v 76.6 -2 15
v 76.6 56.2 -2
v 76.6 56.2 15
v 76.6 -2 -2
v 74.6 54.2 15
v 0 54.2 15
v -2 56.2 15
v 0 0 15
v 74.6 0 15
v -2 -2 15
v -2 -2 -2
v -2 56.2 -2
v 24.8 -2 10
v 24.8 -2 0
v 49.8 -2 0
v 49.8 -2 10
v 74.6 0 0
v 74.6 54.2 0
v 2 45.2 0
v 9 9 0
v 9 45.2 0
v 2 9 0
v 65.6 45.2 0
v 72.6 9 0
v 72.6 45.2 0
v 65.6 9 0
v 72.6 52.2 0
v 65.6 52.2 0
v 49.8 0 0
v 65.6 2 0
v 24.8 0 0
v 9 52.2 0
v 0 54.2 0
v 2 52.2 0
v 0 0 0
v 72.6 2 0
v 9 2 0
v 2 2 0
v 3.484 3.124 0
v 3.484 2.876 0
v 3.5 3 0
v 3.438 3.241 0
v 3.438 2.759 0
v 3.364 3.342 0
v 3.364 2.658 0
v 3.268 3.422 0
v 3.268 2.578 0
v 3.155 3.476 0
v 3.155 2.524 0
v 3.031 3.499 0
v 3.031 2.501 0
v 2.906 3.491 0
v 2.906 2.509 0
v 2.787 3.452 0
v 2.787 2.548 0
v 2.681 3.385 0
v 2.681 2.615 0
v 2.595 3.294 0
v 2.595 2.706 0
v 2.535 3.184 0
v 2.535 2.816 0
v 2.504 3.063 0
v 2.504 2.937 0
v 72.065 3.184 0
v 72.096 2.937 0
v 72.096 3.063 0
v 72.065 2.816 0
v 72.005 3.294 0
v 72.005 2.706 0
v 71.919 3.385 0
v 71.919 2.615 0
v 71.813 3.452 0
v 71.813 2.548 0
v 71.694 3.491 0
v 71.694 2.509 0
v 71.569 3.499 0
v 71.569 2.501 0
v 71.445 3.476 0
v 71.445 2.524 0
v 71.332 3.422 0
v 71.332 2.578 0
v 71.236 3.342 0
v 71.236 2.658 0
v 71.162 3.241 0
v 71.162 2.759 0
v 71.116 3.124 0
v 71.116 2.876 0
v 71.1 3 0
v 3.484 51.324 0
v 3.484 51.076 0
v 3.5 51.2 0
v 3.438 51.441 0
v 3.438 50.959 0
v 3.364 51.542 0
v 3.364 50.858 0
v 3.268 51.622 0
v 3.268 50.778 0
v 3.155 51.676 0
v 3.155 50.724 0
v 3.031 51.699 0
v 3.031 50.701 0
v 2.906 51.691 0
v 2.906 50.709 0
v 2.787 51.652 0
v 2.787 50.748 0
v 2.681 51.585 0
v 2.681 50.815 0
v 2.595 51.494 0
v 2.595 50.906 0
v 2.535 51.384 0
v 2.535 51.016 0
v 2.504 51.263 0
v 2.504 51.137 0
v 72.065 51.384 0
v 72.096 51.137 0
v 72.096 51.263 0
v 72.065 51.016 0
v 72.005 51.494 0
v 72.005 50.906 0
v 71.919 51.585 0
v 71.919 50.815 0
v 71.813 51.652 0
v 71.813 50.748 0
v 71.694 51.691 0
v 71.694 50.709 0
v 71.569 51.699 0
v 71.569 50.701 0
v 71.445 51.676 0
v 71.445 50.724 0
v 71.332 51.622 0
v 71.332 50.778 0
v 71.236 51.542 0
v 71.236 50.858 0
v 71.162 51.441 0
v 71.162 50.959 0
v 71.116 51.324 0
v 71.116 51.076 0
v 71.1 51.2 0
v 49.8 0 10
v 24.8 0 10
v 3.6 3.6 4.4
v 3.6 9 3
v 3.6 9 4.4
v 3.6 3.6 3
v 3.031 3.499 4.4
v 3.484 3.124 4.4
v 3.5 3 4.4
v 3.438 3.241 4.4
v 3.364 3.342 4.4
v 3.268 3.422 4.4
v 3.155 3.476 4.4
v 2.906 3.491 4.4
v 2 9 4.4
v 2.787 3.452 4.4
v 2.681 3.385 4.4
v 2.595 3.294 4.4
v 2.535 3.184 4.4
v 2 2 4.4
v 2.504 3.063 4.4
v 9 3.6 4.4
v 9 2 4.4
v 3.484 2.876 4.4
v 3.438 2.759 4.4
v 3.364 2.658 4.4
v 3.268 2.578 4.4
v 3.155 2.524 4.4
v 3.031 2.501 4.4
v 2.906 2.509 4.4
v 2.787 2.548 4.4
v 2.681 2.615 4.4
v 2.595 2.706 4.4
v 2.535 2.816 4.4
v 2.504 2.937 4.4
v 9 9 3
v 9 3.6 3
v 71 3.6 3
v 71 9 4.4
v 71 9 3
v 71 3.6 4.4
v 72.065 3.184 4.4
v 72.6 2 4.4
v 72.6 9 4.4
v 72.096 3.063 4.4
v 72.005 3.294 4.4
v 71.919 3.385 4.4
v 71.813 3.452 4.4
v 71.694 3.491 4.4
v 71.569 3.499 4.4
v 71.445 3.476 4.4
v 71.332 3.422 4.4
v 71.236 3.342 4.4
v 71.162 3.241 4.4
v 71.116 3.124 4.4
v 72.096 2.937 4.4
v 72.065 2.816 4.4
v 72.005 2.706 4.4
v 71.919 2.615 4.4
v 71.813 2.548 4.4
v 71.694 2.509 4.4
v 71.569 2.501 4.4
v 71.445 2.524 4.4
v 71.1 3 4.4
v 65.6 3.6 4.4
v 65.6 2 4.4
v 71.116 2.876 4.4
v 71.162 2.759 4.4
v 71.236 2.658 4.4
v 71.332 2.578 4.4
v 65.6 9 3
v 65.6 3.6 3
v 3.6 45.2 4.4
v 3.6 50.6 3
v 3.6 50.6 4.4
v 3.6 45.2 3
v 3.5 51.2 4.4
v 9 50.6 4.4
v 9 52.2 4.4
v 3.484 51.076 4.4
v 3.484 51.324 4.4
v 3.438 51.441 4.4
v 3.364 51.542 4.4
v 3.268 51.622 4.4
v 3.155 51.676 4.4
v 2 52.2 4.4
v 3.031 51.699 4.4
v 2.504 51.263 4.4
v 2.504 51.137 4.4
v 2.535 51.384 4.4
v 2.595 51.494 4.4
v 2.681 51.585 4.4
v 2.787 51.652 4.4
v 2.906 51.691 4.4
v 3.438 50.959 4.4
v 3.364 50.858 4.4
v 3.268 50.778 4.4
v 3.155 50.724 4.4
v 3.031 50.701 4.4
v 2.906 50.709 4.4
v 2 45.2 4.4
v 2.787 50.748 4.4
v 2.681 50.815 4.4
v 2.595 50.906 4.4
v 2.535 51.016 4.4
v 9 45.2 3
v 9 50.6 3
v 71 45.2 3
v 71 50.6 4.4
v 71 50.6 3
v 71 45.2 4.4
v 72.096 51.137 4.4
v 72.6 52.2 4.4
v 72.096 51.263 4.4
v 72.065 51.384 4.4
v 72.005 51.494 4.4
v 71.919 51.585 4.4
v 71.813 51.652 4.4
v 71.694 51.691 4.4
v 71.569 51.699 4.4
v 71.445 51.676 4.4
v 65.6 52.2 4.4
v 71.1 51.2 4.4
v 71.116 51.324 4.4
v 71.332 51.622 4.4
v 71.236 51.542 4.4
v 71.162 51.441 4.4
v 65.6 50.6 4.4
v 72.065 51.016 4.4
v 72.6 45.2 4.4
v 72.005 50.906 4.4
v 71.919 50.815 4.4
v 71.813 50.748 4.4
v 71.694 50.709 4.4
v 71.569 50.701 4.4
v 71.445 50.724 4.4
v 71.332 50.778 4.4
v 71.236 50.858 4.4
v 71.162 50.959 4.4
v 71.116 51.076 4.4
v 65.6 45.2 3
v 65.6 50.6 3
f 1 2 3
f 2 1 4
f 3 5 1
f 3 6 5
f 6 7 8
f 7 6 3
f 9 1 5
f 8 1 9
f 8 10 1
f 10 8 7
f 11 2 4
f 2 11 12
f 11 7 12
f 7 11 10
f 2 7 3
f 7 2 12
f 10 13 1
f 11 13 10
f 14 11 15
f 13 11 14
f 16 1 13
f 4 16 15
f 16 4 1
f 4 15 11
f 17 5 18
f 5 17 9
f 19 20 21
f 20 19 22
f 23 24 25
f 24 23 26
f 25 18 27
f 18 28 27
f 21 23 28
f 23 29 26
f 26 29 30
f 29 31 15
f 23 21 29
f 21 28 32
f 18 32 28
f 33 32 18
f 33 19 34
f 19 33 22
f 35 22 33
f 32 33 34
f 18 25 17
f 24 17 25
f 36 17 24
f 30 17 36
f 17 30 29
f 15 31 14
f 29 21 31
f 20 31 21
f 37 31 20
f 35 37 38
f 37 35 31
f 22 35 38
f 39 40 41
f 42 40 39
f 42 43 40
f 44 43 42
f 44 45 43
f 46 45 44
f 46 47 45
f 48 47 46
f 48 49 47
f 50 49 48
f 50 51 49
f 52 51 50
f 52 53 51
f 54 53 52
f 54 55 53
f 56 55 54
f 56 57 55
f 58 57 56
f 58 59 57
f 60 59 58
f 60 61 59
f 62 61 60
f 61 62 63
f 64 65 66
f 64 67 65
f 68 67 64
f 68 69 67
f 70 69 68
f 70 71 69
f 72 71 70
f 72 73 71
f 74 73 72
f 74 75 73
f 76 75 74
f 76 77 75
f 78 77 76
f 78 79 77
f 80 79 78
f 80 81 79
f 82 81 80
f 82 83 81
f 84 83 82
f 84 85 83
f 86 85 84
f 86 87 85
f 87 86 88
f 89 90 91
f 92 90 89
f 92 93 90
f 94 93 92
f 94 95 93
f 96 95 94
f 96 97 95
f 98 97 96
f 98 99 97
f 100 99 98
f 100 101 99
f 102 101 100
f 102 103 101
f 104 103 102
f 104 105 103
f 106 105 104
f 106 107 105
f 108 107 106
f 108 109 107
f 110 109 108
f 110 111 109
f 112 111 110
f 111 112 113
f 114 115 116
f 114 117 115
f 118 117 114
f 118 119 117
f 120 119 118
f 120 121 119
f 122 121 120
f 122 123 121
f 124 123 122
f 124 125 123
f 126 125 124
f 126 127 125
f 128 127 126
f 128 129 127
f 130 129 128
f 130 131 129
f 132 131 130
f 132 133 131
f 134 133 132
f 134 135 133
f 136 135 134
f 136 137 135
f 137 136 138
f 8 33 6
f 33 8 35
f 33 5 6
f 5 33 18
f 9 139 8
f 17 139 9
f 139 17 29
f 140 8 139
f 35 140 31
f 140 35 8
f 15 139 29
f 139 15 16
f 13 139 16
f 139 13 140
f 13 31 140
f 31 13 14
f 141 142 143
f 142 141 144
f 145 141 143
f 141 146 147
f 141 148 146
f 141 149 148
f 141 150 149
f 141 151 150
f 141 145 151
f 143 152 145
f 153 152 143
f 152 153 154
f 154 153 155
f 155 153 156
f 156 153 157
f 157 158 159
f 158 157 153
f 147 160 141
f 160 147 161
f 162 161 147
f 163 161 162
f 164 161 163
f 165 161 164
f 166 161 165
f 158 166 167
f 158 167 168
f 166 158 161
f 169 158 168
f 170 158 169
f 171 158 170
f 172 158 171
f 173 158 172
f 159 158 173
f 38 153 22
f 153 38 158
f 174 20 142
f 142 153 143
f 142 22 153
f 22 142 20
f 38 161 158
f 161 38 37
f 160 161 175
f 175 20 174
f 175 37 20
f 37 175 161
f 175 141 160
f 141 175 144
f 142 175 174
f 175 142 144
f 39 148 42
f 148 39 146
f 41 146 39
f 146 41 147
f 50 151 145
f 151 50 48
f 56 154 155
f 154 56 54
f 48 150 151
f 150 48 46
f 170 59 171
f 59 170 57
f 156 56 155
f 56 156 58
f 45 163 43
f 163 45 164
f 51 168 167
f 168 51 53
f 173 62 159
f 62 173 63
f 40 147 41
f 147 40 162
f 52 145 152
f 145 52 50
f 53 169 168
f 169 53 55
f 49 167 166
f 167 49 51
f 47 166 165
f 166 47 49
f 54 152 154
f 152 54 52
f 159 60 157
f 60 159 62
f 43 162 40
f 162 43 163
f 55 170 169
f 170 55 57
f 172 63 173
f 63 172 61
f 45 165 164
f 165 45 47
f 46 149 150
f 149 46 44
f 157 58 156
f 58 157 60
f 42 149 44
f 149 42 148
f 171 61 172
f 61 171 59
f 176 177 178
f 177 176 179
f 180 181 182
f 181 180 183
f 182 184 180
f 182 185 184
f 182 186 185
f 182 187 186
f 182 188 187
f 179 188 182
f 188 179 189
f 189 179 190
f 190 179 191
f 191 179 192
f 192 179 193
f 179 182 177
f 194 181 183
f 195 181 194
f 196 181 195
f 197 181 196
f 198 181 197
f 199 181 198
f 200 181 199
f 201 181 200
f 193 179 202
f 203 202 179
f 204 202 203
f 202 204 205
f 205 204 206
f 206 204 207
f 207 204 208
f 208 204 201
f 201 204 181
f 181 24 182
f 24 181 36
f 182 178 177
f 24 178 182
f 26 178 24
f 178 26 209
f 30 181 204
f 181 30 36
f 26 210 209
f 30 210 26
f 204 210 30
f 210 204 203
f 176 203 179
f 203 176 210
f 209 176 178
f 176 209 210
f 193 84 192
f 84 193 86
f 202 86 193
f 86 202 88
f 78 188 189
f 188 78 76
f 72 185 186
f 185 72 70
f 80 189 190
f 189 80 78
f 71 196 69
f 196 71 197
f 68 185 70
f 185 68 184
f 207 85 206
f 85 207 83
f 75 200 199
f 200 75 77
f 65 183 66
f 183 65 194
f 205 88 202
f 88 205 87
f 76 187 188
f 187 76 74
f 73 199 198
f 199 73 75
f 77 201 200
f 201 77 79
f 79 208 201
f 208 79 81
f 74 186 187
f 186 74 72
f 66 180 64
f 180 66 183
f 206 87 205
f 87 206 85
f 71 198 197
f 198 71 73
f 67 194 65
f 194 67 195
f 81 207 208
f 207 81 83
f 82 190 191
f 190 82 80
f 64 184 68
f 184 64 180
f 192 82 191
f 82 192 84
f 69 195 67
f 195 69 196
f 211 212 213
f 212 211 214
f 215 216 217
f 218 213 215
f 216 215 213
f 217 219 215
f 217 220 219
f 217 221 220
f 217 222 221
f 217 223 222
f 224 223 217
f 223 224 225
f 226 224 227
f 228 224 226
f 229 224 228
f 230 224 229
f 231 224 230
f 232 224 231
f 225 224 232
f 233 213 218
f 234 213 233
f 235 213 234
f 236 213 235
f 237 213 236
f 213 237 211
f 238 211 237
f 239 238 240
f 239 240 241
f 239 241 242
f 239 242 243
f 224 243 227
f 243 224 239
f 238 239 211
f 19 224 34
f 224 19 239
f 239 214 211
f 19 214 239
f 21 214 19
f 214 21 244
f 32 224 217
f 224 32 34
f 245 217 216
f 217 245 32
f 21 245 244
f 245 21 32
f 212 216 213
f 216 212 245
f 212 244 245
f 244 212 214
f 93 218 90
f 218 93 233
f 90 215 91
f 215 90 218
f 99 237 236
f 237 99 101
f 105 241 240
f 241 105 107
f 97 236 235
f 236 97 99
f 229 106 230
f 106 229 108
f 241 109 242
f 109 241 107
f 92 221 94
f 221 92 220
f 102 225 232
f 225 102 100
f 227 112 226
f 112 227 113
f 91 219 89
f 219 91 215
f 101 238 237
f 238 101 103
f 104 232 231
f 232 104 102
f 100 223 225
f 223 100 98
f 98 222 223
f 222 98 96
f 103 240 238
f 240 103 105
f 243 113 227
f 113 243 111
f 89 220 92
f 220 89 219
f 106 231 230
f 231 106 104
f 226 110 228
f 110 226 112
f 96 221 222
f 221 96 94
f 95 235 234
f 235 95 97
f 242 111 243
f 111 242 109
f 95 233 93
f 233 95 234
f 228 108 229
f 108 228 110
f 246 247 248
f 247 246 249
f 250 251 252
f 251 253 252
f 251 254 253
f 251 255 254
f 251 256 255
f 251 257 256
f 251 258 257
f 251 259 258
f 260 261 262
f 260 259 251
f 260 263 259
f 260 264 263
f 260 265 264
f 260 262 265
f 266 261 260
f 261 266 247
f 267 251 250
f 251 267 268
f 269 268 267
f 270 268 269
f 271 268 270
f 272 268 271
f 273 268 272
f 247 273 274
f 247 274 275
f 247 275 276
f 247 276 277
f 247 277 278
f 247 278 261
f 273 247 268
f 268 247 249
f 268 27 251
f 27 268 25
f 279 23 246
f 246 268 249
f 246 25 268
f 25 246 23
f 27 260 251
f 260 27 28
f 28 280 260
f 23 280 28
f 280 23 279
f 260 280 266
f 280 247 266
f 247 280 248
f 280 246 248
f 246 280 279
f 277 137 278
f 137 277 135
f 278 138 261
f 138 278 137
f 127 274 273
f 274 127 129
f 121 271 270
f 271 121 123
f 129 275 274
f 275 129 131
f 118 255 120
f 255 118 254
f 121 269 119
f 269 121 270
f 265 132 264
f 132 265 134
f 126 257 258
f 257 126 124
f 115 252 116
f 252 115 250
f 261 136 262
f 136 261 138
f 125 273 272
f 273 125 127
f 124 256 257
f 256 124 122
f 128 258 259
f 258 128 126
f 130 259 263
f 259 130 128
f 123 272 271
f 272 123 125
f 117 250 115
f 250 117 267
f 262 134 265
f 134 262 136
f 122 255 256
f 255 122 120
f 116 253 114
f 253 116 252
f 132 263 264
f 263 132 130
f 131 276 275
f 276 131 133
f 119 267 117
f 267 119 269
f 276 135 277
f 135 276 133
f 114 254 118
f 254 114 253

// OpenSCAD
/*
    Created by Ben Vinck 
    2020/9/3
*/

/* [Model] */
CREATE = "body"; //[body:Body, lid:Lid, block:PCB holder block]

/* [Hidden] */
render_offset = 0.1;

/* [PCB params] */
pcb_length = 66.6;
pcb_width = 46.2;

/* [Case params] */
// Height from the inside bottom to the top edge of the body
case_inside_height = 15;
// Thickness of the body, lid and holder block
case_thickness = 2;
// Spacing behind the PCB holders  Top, right, bottom, left
cable_spaceing = [2,2,2,2];
// Axis on which the cable opening will be
cable_opening_side = "x"; //[none,x,y]
// Shape of the cable opening
cable_opening_shape = "rectangle"; //[rectangle:Rectangle, circle:Circle]
// Dimentions of the rectangular cable opening
cable_opening_dimentions = [25,10];
// Diameter of the circular cable opening
cable_opening_diameter = 3;
// Ammount of circular cable openings
cable_opening_ammount = 2;
// Distance between circular cable opening
cable_opening_spaceing = 2;
// Cable opening offset from its center position
cable_opening_offset = [0,0];

/* [Corner support params] */
// Size of PCB clamps
holder_spacing = 2;
// Size of platfrom supporting the PCB
holder_width = 5;
// Height that the PCB will be held
holder_height = 3;
// Height of the PCB clamps
holder_grip_height = 1.4;
// Offset of the PCB clamps. 0 = PCB width and height, >0 = looser fit, <0 = tighter fit. This value depends on your 3D printer
holder_offset = 0.4; //Ultimaker 2
// Hole in the PCB clamps. This is meant to screw the holder blocks in place. 0 for no hole
holder_hole_diameter = 1;
//Height of the holder block
holder_block_height = 2;

/* [Center support params] */
//Will enable a support in the center. Provides extra support in the center of large PCBs
center_support_enable = false;
// X and Y dimentions of the center support
center_support_size = [20,25];
// Offset from the bottom left PCB corner
center_support_offset = [20,10];

/* [Lid params] */
lid_height = case_thickness;
// Distance that the lid locks into the body
lid_depth = 2;
// Offset between the body and lid. 0 = perfect fit, >0 = looser fit, <0 = tighter fit.
lid_offset = 0.3; //Ultimaker 2
// Enable the viewing window
lid_window = false;
// Size of the window supports. 0 to disable
lid_window_support_size = 5;
// Enable image
lid_image = false;
// Image path
lid_image_file = "image.svg";
// Depth of the image inset
lid_image_depth = 0.5;
// Scale of the image
lid_image_scale = 1;
// Rotation of the image
lid_image_rotation = 0; //[0:0.1:360]
// Positional offset of the image
lid_image_offset = [0,0];
// Enable vents
lid_vent = false;
// Length and width of the vents
lid_vent_dimentions = [30,3];
// Ammount if vent slots
lid_vent_ammount = 4;
// Spaceing between the vents
lid_vent_spacing = 3;
// Rotation of the vents
lid_vent_rotation = 0; //[0:0.1:360]
// Positional offset of the vents
lid_vent_offset = [0,0];

/* Modules */
module true_mirror(m, o){
    children();
    translate(o){
        mirror(m){
            children();    
        }
    }
}

module dual_true_mirror(m1, o1, m2, o2){
    true_mirror(m1, o1){
        true_mirror(m2, o2){
            children();
        };
    };
}

module rotate_around_point(r, pt){
    translate(pt){
        rotate(r){
            translate(-pt){
                children();
            }
        }
    }   
}


/* Generate */
//Case
if(CREATE == "body"){
difference(){
    translate([-case_thickness,-case_thickness,-case_thickness]){
        cube([
            pcb_length+cable_spaceing[3]+cable_spaceing[1]+case_thickness*2+holder_spacing*2,
            pcb_width+cable_spaceing[0]+cable_spaceing[2]+case_thickness*2+holder_spacing*2,
            case_inside_height+case_thickness
        ]);
    }
    cube([
        pcb_length+cable_spaceing[3]+cable_spaceing[1]+holder_spacing*2,
        pcb_width+cable_spaceing[0]+cable_spaceing[2]+holder_spacing*2,
        case_inside_height+render_offset
    ]);
    
    //Cable opening
    if(cable_opening_side == "x"){
        if(cable_opening_shape == "rectangle"){
            translate([
                (pcb_length+holder_spacing*2+cable_spaceing[1]+cable_spaceing[3])/2-cable_opening_dimentions[0]/2 + cable_opening_offset[0],
                -case_thickness - render_offset/2,
                cable_opening_offset[1]
            ]){
                cube([cable_opening_dimentions[0], case_thickness + render_offset, cable_opening_dimentions[1]]);
            }
        }
        else if (cable_opening_shape == "circle"){
            rotate([90,0,0]){
                for(i = [0:cable_opening_ammount-1]){
                    translate([
                        (pcb_length+holder_spacing*2+cable_spaceing[1]+cable_spaceing[3])/2 + cable_opening_offset[0] - (cable_opening_ammount-1)*(cable_opening_diameter/2)-cable_opening_spaceing/2*cable_opening_ammount + i*cable_opening_diameter+i*cable_opening_spaceing,
                        cable_opening_diameter/2 + cable_opening_offset[1],
                        -render_offset/2case_height
                    ]){
                        cylinder(case_thickness + render_offset, d=cable_opening_diameter,$fn=50);
                    }
                }
            }
        }
    }
    else if(cable_opening_side == "y"){
        if(cable_opening_shape == "rectangle"){
            translate([
                -case_thickness - render_offset/2,
                (pcb_width+holder_spacing*2+cable_spaceing[0]+cable_spaceing[2])/2-cable_opening_dimentions[0]/2 + cable_opening_offset[0],
                cable_opening_offset[1]
            ]){
                cube([case_thickness + render_offset,cable_opening_dimentions[0],cable_opening_dimentions[1]]);
            }
        }
        else if (cable_opening_shape == "circle"){
            rotate([0,-90,0]){
                for(i = [0:cable_opening_ammount-1]){
                    translate([
                        cable_opening_diameter/2 + cable_opening_offset[1],
                        (pcb_width+holder_spacing*2+cable_spaceing[0]+cable_spaceing[2])/2 + cable_opening_offset[0] - (cable_opening_ammount-1)*(cable_opening_diameter/2)-cable_opening_spaceing/2*cable_opening_ammount + i*cable_opening_diameter+i*cable_opening_spaceing,
                        -render_offset/2
                    ]){
                        cylinder(case_thickness + render_offset, d=cable_opening_diameter,$fn=50);
                    }
                }
            }
        }
    }
}



//Corner support
translate([cable_spaceing[3], cable_spaceing[2], 0]){
    dual_true_mirror([0,1,0], [0,holder_spacing*2 + pcb_width,0], [1,0,0], [holder_spacing*2 + pcb_length,0,0]){
        difference(){
            //Cube
            union(){
                cube([holder_spacing-holder_offset,holder_spacing + holder_width,holder_height + holder_grip_height]);
                cube([holder_spacing + holder_width,holder_spacing-holder_offset,holder_height + holder_grip_height]);
                cube([holder_spacing + holder_width,holder_spacing + holder_width,holder_height]);
            }
            //Hole
            translate([holder_spacing/2,holder_spacing/2,0]){
                cylinder(holder_height + holder_grip_height + render_offset,d=holder_hole_diameter,$fn=25);
            }
        }
    }
}


//Center support
if(center_support_enable){
translate([
        cable_spaceing[3]+holder_spacing+center_support_offset[0],
        cable_spaceing[2]+holder_spacing+center_support_offset[1],
        0
    ]){
    cube([center_support_size[0],center_support_size[1],holder_height]);
}
}
}



//Lid
if(CREATE == "lid"){
difference(){
    union(){
        difference(){
            //Height
            translate([-case_thickness,-case_thickness,-lid_height]){
                cube([
                    pcb_length+cable_spaceing[3]+cable_spaceing[1]+case_thickness*2+holder_spacing*2,
                    pcb_width+cable_spaceing[0]+cable_spaceing[2]+case_thickness*2+holder_spacing*2,
                lid_height
                ]);
            }
            //Image
            if(lid_image == true){
                translate([
                    (pcb_length+cable_spaceing[3]+cable_spaceing[1]+case_thickness+holder_spacing*2)/2+lid_image_offset[0],
                    (pcb_width+cable_spaceing[0]+cable_spaceing[2]+case_thickness+holder_spacing*2)/2+lid_image_offset[1],
                    -case_thickness-0.1
                ]){
                    rotate([0,0,lid_image_rotation]){
                        scale([-lid_image_scale,lid_image_scale,1]){
                            linear_extrude(lid_image_depth+0.1){
                                import(lid_image_file,center=true);
                            }
                        }
                    }
                }
            }
            //Vent
            if(lid_vent == true){
                translate([
                    (pcb_length+cable_spaceing[3]+cable_spaceing[1]+case_thickness+holder_spacing*2)/2-((lid_vent_dimentions[1]+lid_vent_spacing)*lid_vent_ammount-lid_vent_spacing)/2+lid_vent_offset[0],
                    (pcb_width+cable_spaceing[0]+cable_spaceing[2]+case_thickness+holder_spacing*2)/2-(lid_vent_dimentions[0])/2+lid_vent_offset[1],
                    -case_thickness-0.1
                ]){
                    rotate_around_point([0,0,lid_vent_rotation],[((lid_vent_dimentions[1]+lid_vent_spacing)*lid_vent_ammount-lid_vent_spacing)/2,lid_vent_dimentions[0]/2]){
                        for(i=[0:lid_vent_ammount-1]){
                            translate([i*(lid_vent_spacing+lid_vent_dimentions[1]),0,0]){
                                cube([lid_vent_dimentions[1],lid_vent_dimentions[0],case_thickness+0.2]);
                            }
                        }
                    }
                }
            }
        }
        //Depth
        translate([lid_offset,lid_offset,0]){
            cube([
                pcb_length+cable_spaceing[3]+cable_spaceing[1]-lid_offset*2+holder_spacing*2,
                pcb_width+cable_spaceing[0]+cable_spaceing[2]-lid_offset*2+holder_spacing*2,
                lid_depth
            ]);
        }
    }
    //Hollow
    translate([case_thickness+lid_offset,case_thickness+lid_offset,-lid_height+case_thickness]){
        cube([
            pcb_length+cable_spaceing[3]+cable_spaceing[1]-case_thickness*2-lid_offset*2+holder_spacing*2,
            pcb_width+cable_spaceing[0]+cable_spaceing[2]-case_thickness*2-lid_offset*2+holder_spacing*2,
            lid_depth+lid_height-case_thickness + render_offset
        ]);
    }
    //Window
    if(lid_window){
        translate([case_thickness+lid_offset,case_thickness+lid_offset,-lid_height-render_offset/2]){
            cube([
                pcb_length+cable_spaceing[3]+cable_spaceing[1]-case_thickness*2-lid_offset*2+holder_spacing*2,
                pcb_width+cable_spaceing[0]+cable_spaceing[2]-case_thickness*2-lid_offset*2+holder_spacing*2,
                case_thickness+render_offset
            ]);
        }
    }
}
//Window Support
if(lid_window == true){
    translate([case_thickness+lid_offset,case_thickness+lid_offset,-lid_height+case_thickness]){
        dual_true_mirror(
            [0,1,0],
            [0,pcb_width+cable_spaceing[3]+cable_spaceing[1]+holder_spacing-lid_offset*2-case_thickness*2+holder_spacing*2,0],
            [1,0,0],
            [pcb_length+cable_spaceing[3]+cable_spaceing[1]-lid_offset*4-case_thickness+holder_spacing*2,0,0]
        ){
            cube([lid_window_support_size,lid_window_support_size,lid_depth]);
        }
    }
}
}



if(CREATE == "block"){
difference(){
    //Cube
    cube([holder_spacing+holder_width,holder_spacing+holder_width,holder_block_height]);
    //Hole
    translate([holder_spacing/2,holder_spacing/2,-render_offset/2]){
        cylinder(holder_block_height+render_offset,d=holder_hole_diameter,$fn=25);
    }
}
}
